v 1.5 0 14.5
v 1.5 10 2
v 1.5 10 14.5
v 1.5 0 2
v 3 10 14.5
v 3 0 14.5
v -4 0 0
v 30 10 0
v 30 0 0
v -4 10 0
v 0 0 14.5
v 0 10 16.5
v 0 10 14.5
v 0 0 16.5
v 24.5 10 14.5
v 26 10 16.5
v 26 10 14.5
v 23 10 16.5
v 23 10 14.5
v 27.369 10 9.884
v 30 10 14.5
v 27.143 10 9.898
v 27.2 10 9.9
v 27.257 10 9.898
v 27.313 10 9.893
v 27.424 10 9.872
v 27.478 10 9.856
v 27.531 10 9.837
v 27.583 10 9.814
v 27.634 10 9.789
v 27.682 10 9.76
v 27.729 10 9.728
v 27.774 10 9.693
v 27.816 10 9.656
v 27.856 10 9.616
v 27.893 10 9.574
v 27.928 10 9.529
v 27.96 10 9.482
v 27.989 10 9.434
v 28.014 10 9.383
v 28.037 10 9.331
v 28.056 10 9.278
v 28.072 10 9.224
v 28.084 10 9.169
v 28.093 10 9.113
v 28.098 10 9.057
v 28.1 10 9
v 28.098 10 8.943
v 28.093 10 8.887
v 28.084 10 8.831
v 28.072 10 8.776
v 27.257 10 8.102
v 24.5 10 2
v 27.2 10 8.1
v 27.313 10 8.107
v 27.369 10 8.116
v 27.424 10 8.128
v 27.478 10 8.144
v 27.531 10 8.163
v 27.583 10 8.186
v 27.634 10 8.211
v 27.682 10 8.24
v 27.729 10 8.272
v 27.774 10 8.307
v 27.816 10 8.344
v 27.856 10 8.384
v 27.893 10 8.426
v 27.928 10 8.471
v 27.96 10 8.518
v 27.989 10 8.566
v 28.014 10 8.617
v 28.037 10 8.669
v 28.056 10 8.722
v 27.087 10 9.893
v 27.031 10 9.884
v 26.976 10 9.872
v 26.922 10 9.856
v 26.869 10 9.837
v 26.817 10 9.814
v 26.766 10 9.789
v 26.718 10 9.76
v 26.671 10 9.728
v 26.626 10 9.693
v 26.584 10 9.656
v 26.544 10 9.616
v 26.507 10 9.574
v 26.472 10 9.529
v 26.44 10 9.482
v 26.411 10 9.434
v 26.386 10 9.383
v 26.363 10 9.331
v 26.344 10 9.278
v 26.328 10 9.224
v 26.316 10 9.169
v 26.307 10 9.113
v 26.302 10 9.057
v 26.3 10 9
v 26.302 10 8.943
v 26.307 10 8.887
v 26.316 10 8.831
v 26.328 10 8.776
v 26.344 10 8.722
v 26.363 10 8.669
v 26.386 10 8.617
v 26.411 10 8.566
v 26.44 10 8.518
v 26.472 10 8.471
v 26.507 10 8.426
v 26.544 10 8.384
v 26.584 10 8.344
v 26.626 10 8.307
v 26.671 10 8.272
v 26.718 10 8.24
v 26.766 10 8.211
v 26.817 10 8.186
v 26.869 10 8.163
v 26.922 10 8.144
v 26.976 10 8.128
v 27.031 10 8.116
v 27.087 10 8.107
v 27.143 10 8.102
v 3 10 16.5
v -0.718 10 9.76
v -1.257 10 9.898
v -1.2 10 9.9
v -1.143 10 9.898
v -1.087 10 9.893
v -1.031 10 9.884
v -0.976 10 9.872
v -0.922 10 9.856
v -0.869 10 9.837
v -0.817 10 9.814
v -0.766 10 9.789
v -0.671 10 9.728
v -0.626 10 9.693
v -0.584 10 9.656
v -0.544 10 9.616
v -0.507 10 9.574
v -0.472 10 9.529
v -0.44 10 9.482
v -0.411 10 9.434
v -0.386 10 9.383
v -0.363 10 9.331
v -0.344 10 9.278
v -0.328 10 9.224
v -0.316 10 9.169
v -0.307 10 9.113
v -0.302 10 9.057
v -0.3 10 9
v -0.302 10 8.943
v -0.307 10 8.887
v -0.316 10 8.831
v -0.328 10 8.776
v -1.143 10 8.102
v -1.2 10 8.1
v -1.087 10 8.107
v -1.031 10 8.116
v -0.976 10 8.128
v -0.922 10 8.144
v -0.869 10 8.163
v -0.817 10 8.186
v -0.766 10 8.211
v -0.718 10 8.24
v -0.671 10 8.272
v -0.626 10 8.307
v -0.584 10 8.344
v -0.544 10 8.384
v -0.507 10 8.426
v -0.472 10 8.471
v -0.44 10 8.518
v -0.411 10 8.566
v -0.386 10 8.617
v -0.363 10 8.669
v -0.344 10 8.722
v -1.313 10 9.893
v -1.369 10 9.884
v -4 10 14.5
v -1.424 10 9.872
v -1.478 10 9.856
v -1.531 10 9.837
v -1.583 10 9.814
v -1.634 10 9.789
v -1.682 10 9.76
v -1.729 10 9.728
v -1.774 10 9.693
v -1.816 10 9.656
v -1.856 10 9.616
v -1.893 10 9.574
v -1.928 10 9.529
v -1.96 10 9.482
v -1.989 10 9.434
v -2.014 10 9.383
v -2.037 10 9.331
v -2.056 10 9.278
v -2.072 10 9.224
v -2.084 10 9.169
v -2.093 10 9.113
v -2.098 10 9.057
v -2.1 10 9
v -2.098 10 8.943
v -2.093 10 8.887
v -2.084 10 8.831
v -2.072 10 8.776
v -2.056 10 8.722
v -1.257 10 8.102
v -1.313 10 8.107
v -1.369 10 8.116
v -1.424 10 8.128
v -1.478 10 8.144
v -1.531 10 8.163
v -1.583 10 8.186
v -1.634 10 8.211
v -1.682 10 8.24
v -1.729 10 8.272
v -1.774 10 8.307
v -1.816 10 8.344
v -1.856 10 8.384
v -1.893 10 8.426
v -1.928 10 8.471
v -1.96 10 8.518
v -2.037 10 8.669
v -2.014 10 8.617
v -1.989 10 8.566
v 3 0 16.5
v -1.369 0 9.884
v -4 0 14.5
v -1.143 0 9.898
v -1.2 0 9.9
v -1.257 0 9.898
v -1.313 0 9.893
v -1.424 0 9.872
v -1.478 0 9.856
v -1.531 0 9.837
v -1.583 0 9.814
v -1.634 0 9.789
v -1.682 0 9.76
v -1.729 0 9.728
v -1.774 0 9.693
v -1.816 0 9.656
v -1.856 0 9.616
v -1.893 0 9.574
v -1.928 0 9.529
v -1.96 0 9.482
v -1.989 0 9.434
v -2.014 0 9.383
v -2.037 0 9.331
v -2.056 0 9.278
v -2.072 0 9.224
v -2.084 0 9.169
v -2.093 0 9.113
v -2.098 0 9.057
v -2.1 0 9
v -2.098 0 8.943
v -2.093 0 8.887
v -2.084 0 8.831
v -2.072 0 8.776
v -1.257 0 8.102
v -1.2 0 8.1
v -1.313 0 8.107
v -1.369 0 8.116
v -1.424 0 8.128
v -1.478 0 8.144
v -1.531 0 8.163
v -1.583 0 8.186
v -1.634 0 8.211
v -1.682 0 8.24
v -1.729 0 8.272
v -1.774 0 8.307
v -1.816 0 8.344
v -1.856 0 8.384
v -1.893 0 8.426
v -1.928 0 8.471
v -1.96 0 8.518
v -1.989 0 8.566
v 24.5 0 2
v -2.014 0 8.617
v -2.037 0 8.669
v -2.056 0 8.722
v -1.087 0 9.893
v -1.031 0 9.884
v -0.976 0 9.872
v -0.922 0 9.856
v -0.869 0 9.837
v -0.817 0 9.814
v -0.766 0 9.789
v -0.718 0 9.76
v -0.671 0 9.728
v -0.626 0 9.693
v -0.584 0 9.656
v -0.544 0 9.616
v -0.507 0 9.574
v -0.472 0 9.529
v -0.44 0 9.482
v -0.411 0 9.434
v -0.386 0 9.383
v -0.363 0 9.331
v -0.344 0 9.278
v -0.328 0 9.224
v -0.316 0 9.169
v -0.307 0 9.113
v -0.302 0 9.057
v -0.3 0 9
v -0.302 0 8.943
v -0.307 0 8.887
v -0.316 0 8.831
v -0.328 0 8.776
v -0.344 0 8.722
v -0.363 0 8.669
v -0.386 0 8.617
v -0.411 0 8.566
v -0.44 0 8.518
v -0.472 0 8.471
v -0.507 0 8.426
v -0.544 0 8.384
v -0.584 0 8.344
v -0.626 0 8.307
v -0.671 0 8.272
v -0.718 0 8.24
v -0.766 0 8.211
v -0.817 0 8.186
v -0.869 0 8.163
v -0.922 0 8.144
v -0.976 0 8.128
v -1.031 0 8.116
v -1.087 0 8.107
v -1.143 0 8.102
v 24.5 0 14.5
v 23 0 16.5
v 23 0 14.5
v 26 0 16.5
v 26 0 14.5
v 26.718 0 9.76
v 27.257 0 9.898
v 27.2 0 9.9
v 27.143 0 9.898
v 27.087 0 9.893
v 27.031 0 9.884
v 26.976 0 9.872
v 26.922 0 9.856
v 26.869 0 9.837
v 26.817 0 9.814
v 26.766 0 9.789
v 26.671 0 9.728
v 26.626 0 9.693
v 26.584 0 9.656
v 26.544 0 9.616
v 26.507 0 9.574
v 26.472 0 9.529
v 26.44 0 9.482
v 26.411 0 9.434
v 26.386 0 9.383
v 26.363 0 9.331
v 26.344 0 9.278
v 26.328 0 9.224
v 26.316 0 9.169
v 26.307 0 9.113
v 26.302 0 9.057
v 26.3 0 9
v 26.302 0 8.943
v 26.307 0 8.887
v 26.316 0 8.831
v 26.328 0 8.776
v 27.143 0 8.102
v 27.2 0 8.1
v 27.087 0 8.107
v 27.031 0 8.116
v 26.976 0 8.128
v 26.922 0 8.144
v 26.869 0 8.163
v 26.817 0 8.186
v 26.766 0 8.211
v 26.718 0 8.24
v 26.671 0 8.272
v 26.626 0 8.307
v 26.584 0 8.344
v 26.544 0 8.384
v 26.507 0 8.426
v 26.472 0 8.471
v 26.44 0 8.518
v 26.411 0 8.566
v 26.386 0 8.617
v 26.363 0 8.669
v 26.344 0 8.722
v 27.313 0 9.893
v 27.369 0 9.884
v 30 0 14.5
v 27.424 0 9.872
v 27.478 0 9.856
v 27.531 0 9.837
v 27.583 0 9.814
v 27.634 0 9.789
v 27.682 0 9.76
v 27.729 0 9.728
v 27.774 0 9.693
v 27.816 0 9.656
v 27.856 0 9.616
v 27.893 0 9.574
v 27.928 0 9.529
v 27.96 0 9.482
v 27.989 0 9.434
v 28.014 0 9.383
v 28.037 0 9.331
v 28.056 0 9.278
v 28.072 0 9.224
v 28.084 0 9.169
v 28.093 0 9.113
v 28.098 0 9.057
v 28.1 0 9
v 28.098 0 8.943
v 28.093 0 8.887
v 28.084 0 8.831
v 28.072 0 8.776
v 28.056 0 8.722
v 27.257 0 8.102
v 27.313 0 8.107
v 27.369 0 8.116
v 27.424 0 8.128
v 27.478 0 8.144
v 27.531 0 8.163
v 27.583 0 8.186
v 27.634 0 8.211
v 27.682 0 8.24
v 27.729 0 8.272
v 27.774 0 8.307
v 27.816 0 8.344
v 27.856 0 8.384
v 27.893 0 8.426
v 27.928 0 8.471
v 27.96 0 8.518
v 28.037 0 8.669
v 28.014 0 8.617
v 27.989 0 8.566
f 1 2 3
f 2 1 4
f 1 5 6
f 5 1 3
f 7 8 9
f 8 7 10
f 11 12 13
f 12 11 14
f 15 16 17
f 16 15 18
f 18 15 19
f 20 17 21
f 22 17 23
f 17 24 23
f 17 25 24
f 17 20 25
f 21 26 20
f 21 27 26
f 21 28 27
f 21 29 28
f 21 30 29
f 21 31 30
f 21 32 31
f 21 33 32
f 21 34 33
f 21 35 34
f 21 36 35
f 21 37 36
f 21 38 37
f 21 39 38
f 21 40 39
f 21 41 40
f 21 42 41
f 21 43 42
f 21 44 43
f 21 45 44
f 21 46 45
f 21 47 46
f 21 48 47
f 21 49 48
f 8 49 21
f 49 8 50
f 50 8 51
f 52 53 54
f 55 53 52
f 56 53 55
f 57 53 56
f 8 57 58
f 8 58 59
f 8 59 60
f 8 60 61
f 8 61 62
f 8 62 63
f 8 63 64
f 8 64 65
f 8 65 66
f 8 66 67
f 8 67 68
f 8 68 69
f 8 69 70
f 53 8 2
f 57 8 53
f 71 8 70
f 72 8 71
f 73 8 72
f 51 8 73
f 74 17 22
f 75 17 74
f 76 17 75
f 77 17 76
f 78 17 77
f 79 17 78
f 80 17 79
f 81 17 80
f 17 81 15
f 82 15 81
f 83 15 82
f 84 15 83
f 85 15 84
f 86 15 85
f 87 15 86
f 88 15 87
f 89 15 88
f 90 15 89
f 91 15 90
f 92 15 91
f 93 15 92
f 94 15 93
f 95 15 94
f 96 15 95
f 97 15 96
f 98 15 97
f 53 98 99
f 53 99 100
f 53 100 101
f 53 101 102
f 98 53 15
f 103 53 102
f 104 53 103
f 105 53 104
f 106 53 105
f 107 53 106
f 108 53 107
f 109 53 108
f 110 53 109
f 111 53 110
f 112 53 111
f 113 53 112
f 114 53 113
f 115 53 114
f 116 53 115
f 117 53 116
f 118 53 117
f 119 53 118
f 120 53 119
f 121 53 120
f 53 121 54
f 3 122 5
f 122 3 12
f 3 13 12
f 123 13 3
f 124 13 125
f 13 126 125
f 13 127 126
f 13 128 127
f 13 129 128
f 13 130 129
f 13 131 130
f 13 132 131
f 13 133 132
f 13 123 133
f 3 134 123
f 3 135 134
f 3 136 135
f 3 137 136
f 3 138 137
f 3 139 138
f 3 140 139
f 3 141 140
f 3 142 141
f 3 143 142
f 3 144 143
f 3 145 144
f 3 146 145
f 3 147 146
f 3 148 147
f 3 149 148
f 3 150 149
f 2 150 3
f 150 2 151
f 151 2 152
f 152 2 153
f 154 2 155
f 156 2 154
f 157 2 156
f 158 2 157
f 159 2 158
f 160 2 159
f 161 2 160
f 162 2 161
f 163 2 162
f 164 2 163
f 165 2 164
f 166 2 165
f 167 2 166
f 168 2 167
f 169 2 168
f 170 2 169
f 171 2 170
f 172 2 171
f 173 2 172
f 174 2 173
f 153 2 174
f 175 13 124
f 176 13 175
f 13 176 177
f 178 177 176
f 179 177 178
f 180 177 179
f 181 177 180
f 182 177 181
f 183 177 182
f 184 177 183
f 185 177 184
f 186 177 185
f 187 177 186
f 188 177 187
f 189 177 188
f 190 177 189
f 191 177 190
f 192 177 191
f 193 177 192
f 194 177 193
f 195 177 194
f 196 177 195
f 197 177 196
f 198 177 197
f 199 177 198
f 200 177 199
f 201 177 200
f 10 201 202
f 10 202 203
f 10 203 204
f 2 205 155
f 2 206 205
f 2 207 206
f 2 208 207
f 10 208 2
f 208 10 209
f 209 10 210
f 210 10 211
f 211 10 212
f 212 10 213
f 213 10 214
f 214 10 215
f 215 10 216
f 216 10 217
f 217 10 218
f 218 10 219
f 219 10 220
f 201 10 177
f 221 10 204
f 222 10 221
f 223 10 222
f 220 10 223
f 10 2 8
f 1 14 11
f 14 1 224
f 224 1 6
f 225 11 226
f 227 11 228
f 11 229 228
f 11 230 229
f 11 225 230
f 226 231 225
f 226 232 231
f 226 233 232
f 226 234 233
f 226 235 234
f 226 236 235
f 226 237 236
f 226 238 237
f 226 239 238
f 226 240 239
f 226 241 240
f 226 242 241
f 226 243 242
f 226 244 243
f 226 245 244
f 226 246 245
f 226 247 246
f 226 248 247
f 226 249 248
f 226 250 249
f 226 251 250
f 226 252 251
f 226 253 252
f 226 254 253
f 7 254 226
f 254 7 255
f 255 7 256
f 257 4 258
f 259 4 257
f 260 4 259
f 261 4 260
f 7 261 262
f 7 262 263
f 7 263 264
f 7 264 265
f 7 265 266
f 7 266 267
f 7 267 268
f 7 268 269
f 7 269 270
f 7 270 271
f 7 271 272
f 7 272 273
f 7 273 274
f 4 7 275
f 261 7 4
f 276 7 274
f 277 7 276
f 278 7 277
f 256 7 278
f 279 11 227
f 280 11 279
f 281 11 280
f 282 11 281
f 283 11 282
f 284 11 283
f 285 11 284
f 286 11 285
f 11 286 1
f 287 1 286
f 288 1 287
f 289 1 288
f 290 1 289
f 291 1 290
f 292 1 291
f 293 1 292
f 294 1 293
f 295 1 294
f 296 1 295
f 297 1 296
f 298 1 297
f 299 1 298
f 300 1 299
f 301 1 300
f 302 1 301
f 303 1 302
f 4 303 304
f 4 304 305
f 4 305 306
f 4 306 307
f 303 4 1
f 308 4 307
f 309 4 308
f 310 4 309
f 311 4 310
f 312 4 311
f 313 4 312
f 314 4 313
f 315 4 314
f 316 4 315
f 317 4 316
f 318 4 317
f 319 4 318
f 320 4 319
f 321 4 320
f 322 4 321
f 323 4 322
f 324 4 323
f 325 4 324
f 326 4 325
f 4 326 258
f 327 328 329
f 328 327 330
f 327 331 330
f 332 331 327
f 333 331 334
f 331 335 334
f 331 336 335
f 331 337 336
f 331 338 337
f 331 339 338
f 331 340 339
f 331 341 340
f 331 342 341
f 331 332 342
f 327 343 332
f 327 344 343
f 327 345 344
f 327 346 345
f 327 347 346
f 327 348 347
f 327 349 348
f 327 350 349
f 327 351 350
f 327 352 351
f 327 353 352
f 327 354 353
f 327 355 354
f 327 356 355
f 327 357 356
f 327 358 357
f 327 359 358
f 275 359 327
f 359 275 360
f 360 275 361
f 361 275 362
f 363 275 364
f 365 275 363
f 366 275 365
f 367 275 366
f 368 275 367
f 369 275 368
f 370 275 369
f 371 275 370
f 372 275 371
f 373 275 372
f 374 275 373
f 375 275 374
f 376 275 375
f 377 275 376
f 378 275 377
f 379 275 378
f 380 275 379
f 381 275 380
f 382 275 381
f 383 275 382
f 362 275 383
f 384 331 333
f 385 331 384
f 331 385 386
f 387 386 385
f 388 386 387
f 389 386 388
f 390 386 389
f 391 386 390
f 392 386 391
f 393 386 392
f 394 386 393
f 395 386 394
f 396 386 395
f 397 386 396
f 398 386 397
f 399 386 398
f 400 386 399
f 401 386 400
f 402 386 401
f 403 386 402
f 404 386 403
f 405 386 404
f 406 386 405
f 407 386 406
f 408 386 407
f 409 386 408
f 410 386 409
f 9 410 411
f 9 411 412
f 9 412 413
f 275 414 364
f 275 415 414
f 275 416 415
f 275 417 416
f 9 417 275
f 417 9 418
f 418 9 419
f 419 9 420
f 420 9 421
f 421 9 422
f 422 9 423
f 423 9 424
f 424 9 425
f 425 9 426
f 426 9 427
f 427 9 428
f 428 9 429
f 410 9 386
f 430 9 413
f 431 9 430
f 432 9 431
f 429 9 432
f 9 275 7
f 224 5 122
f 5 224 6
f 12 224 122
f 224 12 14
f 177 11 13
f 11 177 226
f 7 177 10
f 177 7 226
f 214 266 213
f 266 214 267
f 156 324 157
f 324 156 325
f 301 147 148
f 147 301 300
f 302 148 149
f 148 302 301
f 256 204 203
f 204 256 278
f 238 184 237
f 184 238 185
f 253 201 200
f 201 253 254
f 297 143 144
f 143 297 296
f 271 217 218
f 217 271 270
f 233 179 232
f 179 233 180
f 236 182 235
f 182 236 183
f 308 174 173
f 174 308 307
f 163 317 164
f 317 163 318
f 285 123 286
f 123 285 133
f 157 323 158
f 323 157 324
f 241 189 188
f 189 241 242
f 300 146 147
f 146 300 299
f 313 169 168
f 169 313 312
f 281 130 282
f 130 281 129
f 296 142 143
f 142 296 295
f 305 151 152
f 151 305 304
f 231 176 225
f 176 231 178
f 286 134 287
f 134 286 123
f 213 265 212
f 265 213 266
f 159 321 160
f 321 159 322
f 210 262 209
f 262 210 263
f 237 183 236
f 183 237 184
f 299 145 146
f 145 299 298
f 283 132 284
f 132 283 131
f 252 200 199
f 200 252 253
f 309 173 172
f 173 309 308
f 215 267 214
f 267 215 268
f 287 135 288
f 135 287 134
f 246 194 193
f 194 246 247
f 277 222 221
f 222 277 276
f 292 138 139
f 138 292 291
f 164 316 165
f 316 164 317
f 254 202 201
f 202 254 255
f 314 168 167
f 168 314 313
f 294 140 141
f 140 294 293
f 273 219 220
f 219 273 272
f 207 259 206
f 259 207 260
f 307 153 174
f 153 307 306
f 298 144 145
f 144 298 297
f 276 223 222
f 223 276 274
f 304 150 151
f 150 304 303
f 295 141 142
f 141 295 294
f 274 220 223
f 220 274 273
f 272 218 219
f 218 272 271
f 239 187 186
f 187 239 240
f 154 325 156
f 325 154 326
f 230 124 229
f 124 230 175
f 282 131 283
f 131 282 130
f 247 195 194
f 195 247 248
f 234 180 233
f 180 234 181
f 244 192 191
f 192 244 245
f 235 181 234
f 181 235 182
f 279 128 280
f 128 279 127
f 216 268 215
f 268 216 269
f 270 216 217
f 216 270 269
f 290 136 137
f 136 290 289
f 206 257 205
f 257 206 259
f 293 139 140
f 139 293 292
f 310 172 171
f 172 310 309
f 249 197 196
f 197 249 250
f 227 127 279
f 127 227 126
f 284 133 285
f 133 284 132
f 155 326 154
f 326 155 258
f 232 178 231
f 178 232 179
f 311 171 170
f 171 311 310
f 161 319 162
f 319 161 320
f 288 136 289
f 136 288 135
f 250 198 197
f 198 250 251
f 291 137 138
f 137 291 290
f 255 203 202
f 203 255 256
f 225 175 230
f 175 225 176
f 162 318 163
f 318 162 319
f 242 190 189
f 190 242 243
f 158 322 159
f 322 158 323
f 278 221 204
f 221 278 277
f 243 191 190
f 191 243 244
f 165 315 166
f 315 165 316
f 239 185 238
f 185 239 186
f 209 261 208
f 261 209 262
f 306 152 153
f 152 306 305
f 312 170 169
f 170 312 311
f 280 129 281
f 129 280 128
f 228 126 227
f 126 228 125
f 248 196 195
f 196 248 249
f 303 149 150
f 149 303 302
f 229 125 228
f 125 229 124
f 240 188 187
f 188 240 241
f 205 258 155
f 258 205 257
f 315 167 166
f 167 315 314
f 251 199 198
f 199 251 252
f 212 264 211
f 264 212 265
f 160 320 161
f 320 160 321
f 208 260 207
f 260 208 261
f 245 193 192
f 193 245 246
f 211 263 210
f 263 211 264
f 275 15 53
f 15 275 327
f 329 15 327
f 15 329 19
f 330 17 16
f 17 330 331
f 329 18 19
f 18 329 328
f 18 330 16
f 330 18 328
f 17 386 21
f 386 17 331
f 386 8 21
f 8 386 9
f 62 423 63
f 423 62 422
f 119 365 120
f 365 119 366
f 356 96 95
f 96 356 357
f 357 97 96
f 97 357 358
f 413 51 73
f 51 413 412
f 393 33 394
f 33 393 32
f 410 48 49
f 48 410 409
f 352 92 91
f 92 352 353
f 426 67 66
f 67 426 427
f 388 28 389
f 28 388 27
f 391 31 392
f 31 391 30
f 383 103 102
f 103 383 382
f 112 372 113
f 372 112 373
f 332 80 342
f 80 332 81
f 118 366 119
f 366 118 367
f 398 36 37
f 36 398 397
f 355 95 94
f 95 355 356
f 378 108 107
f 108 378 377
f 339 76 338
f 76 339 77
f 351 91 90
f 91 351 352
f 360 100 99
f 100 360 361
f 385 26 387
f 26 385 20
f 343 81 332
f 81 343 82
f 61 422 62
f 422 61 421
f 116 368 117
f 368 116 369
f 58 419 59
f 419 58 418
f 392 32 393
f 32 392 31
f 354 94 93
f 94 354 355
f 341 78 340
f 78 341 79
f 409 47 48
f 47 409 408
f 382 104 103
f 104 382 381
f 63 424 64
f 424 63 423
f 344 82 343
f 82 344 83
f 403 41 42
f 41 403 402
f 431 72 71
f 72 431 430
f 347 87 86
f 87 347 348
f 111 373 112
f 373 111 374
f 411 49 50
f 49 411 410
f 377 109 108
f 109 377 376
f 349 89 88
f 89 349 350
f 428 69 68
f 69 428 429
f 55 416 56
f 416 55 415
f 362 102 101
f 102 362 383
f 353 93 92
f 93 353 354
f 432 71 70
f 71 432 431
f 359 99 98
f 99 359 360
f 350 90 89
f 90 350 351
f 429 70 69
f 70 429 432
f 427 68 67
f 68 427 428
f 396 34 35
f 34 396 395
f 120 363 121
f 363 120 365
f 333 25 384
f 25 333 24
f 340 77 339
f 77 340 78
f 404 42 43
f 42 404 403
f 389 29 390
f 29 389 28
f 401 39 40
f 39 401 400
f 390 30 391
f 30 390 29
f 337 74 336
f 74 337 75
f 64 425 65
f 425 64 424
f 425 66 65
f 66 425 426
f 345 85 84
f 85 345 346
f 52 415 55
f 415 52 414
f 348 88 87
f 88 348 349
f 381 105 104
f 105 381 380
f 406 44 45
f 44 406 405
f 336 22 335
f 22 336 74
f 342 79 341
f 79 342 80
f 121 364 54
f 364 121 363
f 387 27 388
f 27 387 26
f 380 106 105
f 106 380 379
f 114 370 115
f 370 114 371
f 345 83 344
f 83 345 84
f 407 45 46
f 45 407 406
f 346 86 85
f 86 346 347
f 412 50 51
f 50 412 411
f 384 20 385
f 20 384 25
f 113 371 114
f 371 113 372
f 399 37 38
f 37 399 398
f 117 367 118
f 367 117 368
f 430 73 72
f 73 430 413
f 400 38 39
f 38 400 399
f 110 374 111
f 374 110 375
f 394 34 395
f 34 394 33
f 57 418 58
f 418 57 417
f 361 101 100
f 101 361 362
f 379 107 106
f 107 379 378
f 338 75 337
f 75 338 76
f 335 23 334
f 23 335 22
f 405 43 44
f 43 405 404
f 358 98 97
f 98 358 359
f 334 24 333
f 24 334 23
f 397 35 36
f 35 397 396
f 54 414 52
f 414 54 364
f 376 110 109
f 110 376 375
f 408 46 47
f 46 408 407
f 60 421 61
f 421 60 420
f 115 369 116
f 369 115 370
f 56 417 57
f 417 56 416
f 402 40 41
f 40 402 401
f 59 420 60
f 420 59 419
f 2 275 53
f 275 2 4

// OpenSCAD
/*
 * Experimental micro servo mount
 * (meant to be printable upright with the clip facing upwards).
 * All measurements are in mm. 
 * @author: Suyash Kumar <suyash@suyashkumar.com>
 */
$fn = 100;
// All measurements in mm
servo_length = 23; 

servo_holder_width = 10; 
servo_holder_height = 14.5;
servo_holder_depth = 2;

clip_width = 1.5;
clip_overhang = 1.5;

screw_hole_z = 9;
screw_hole_x = -1.2;

module servo_clip_handle() {
    difference() {
        union() {
            cube([clip_width, servo_holder_width, servo_holder_height]);
            translate([0, 0, servo_holder_height])cube([clip_width + clip_overhang, servo_holder_width, servo_holder_depth]);
            translate([-4, 0, 0])cube([4, servo_holder_width, servo_holder_height]);
        }
        translate([screw_hole_x, 0, screw_hole_z])rotate([90, 0, 0])cylinder(d=1.8, h=100, center=true);
    }
}

module servo_clip() {
    union() {
        cube([25, servo_holder_width, servo_holder_depth]);
        servo_clip_handle();
        translate([servo_length + 2*clip_width, 0,0])mirror([1,0,0])servo_clip_handle();
    }
}

servo_clip();
